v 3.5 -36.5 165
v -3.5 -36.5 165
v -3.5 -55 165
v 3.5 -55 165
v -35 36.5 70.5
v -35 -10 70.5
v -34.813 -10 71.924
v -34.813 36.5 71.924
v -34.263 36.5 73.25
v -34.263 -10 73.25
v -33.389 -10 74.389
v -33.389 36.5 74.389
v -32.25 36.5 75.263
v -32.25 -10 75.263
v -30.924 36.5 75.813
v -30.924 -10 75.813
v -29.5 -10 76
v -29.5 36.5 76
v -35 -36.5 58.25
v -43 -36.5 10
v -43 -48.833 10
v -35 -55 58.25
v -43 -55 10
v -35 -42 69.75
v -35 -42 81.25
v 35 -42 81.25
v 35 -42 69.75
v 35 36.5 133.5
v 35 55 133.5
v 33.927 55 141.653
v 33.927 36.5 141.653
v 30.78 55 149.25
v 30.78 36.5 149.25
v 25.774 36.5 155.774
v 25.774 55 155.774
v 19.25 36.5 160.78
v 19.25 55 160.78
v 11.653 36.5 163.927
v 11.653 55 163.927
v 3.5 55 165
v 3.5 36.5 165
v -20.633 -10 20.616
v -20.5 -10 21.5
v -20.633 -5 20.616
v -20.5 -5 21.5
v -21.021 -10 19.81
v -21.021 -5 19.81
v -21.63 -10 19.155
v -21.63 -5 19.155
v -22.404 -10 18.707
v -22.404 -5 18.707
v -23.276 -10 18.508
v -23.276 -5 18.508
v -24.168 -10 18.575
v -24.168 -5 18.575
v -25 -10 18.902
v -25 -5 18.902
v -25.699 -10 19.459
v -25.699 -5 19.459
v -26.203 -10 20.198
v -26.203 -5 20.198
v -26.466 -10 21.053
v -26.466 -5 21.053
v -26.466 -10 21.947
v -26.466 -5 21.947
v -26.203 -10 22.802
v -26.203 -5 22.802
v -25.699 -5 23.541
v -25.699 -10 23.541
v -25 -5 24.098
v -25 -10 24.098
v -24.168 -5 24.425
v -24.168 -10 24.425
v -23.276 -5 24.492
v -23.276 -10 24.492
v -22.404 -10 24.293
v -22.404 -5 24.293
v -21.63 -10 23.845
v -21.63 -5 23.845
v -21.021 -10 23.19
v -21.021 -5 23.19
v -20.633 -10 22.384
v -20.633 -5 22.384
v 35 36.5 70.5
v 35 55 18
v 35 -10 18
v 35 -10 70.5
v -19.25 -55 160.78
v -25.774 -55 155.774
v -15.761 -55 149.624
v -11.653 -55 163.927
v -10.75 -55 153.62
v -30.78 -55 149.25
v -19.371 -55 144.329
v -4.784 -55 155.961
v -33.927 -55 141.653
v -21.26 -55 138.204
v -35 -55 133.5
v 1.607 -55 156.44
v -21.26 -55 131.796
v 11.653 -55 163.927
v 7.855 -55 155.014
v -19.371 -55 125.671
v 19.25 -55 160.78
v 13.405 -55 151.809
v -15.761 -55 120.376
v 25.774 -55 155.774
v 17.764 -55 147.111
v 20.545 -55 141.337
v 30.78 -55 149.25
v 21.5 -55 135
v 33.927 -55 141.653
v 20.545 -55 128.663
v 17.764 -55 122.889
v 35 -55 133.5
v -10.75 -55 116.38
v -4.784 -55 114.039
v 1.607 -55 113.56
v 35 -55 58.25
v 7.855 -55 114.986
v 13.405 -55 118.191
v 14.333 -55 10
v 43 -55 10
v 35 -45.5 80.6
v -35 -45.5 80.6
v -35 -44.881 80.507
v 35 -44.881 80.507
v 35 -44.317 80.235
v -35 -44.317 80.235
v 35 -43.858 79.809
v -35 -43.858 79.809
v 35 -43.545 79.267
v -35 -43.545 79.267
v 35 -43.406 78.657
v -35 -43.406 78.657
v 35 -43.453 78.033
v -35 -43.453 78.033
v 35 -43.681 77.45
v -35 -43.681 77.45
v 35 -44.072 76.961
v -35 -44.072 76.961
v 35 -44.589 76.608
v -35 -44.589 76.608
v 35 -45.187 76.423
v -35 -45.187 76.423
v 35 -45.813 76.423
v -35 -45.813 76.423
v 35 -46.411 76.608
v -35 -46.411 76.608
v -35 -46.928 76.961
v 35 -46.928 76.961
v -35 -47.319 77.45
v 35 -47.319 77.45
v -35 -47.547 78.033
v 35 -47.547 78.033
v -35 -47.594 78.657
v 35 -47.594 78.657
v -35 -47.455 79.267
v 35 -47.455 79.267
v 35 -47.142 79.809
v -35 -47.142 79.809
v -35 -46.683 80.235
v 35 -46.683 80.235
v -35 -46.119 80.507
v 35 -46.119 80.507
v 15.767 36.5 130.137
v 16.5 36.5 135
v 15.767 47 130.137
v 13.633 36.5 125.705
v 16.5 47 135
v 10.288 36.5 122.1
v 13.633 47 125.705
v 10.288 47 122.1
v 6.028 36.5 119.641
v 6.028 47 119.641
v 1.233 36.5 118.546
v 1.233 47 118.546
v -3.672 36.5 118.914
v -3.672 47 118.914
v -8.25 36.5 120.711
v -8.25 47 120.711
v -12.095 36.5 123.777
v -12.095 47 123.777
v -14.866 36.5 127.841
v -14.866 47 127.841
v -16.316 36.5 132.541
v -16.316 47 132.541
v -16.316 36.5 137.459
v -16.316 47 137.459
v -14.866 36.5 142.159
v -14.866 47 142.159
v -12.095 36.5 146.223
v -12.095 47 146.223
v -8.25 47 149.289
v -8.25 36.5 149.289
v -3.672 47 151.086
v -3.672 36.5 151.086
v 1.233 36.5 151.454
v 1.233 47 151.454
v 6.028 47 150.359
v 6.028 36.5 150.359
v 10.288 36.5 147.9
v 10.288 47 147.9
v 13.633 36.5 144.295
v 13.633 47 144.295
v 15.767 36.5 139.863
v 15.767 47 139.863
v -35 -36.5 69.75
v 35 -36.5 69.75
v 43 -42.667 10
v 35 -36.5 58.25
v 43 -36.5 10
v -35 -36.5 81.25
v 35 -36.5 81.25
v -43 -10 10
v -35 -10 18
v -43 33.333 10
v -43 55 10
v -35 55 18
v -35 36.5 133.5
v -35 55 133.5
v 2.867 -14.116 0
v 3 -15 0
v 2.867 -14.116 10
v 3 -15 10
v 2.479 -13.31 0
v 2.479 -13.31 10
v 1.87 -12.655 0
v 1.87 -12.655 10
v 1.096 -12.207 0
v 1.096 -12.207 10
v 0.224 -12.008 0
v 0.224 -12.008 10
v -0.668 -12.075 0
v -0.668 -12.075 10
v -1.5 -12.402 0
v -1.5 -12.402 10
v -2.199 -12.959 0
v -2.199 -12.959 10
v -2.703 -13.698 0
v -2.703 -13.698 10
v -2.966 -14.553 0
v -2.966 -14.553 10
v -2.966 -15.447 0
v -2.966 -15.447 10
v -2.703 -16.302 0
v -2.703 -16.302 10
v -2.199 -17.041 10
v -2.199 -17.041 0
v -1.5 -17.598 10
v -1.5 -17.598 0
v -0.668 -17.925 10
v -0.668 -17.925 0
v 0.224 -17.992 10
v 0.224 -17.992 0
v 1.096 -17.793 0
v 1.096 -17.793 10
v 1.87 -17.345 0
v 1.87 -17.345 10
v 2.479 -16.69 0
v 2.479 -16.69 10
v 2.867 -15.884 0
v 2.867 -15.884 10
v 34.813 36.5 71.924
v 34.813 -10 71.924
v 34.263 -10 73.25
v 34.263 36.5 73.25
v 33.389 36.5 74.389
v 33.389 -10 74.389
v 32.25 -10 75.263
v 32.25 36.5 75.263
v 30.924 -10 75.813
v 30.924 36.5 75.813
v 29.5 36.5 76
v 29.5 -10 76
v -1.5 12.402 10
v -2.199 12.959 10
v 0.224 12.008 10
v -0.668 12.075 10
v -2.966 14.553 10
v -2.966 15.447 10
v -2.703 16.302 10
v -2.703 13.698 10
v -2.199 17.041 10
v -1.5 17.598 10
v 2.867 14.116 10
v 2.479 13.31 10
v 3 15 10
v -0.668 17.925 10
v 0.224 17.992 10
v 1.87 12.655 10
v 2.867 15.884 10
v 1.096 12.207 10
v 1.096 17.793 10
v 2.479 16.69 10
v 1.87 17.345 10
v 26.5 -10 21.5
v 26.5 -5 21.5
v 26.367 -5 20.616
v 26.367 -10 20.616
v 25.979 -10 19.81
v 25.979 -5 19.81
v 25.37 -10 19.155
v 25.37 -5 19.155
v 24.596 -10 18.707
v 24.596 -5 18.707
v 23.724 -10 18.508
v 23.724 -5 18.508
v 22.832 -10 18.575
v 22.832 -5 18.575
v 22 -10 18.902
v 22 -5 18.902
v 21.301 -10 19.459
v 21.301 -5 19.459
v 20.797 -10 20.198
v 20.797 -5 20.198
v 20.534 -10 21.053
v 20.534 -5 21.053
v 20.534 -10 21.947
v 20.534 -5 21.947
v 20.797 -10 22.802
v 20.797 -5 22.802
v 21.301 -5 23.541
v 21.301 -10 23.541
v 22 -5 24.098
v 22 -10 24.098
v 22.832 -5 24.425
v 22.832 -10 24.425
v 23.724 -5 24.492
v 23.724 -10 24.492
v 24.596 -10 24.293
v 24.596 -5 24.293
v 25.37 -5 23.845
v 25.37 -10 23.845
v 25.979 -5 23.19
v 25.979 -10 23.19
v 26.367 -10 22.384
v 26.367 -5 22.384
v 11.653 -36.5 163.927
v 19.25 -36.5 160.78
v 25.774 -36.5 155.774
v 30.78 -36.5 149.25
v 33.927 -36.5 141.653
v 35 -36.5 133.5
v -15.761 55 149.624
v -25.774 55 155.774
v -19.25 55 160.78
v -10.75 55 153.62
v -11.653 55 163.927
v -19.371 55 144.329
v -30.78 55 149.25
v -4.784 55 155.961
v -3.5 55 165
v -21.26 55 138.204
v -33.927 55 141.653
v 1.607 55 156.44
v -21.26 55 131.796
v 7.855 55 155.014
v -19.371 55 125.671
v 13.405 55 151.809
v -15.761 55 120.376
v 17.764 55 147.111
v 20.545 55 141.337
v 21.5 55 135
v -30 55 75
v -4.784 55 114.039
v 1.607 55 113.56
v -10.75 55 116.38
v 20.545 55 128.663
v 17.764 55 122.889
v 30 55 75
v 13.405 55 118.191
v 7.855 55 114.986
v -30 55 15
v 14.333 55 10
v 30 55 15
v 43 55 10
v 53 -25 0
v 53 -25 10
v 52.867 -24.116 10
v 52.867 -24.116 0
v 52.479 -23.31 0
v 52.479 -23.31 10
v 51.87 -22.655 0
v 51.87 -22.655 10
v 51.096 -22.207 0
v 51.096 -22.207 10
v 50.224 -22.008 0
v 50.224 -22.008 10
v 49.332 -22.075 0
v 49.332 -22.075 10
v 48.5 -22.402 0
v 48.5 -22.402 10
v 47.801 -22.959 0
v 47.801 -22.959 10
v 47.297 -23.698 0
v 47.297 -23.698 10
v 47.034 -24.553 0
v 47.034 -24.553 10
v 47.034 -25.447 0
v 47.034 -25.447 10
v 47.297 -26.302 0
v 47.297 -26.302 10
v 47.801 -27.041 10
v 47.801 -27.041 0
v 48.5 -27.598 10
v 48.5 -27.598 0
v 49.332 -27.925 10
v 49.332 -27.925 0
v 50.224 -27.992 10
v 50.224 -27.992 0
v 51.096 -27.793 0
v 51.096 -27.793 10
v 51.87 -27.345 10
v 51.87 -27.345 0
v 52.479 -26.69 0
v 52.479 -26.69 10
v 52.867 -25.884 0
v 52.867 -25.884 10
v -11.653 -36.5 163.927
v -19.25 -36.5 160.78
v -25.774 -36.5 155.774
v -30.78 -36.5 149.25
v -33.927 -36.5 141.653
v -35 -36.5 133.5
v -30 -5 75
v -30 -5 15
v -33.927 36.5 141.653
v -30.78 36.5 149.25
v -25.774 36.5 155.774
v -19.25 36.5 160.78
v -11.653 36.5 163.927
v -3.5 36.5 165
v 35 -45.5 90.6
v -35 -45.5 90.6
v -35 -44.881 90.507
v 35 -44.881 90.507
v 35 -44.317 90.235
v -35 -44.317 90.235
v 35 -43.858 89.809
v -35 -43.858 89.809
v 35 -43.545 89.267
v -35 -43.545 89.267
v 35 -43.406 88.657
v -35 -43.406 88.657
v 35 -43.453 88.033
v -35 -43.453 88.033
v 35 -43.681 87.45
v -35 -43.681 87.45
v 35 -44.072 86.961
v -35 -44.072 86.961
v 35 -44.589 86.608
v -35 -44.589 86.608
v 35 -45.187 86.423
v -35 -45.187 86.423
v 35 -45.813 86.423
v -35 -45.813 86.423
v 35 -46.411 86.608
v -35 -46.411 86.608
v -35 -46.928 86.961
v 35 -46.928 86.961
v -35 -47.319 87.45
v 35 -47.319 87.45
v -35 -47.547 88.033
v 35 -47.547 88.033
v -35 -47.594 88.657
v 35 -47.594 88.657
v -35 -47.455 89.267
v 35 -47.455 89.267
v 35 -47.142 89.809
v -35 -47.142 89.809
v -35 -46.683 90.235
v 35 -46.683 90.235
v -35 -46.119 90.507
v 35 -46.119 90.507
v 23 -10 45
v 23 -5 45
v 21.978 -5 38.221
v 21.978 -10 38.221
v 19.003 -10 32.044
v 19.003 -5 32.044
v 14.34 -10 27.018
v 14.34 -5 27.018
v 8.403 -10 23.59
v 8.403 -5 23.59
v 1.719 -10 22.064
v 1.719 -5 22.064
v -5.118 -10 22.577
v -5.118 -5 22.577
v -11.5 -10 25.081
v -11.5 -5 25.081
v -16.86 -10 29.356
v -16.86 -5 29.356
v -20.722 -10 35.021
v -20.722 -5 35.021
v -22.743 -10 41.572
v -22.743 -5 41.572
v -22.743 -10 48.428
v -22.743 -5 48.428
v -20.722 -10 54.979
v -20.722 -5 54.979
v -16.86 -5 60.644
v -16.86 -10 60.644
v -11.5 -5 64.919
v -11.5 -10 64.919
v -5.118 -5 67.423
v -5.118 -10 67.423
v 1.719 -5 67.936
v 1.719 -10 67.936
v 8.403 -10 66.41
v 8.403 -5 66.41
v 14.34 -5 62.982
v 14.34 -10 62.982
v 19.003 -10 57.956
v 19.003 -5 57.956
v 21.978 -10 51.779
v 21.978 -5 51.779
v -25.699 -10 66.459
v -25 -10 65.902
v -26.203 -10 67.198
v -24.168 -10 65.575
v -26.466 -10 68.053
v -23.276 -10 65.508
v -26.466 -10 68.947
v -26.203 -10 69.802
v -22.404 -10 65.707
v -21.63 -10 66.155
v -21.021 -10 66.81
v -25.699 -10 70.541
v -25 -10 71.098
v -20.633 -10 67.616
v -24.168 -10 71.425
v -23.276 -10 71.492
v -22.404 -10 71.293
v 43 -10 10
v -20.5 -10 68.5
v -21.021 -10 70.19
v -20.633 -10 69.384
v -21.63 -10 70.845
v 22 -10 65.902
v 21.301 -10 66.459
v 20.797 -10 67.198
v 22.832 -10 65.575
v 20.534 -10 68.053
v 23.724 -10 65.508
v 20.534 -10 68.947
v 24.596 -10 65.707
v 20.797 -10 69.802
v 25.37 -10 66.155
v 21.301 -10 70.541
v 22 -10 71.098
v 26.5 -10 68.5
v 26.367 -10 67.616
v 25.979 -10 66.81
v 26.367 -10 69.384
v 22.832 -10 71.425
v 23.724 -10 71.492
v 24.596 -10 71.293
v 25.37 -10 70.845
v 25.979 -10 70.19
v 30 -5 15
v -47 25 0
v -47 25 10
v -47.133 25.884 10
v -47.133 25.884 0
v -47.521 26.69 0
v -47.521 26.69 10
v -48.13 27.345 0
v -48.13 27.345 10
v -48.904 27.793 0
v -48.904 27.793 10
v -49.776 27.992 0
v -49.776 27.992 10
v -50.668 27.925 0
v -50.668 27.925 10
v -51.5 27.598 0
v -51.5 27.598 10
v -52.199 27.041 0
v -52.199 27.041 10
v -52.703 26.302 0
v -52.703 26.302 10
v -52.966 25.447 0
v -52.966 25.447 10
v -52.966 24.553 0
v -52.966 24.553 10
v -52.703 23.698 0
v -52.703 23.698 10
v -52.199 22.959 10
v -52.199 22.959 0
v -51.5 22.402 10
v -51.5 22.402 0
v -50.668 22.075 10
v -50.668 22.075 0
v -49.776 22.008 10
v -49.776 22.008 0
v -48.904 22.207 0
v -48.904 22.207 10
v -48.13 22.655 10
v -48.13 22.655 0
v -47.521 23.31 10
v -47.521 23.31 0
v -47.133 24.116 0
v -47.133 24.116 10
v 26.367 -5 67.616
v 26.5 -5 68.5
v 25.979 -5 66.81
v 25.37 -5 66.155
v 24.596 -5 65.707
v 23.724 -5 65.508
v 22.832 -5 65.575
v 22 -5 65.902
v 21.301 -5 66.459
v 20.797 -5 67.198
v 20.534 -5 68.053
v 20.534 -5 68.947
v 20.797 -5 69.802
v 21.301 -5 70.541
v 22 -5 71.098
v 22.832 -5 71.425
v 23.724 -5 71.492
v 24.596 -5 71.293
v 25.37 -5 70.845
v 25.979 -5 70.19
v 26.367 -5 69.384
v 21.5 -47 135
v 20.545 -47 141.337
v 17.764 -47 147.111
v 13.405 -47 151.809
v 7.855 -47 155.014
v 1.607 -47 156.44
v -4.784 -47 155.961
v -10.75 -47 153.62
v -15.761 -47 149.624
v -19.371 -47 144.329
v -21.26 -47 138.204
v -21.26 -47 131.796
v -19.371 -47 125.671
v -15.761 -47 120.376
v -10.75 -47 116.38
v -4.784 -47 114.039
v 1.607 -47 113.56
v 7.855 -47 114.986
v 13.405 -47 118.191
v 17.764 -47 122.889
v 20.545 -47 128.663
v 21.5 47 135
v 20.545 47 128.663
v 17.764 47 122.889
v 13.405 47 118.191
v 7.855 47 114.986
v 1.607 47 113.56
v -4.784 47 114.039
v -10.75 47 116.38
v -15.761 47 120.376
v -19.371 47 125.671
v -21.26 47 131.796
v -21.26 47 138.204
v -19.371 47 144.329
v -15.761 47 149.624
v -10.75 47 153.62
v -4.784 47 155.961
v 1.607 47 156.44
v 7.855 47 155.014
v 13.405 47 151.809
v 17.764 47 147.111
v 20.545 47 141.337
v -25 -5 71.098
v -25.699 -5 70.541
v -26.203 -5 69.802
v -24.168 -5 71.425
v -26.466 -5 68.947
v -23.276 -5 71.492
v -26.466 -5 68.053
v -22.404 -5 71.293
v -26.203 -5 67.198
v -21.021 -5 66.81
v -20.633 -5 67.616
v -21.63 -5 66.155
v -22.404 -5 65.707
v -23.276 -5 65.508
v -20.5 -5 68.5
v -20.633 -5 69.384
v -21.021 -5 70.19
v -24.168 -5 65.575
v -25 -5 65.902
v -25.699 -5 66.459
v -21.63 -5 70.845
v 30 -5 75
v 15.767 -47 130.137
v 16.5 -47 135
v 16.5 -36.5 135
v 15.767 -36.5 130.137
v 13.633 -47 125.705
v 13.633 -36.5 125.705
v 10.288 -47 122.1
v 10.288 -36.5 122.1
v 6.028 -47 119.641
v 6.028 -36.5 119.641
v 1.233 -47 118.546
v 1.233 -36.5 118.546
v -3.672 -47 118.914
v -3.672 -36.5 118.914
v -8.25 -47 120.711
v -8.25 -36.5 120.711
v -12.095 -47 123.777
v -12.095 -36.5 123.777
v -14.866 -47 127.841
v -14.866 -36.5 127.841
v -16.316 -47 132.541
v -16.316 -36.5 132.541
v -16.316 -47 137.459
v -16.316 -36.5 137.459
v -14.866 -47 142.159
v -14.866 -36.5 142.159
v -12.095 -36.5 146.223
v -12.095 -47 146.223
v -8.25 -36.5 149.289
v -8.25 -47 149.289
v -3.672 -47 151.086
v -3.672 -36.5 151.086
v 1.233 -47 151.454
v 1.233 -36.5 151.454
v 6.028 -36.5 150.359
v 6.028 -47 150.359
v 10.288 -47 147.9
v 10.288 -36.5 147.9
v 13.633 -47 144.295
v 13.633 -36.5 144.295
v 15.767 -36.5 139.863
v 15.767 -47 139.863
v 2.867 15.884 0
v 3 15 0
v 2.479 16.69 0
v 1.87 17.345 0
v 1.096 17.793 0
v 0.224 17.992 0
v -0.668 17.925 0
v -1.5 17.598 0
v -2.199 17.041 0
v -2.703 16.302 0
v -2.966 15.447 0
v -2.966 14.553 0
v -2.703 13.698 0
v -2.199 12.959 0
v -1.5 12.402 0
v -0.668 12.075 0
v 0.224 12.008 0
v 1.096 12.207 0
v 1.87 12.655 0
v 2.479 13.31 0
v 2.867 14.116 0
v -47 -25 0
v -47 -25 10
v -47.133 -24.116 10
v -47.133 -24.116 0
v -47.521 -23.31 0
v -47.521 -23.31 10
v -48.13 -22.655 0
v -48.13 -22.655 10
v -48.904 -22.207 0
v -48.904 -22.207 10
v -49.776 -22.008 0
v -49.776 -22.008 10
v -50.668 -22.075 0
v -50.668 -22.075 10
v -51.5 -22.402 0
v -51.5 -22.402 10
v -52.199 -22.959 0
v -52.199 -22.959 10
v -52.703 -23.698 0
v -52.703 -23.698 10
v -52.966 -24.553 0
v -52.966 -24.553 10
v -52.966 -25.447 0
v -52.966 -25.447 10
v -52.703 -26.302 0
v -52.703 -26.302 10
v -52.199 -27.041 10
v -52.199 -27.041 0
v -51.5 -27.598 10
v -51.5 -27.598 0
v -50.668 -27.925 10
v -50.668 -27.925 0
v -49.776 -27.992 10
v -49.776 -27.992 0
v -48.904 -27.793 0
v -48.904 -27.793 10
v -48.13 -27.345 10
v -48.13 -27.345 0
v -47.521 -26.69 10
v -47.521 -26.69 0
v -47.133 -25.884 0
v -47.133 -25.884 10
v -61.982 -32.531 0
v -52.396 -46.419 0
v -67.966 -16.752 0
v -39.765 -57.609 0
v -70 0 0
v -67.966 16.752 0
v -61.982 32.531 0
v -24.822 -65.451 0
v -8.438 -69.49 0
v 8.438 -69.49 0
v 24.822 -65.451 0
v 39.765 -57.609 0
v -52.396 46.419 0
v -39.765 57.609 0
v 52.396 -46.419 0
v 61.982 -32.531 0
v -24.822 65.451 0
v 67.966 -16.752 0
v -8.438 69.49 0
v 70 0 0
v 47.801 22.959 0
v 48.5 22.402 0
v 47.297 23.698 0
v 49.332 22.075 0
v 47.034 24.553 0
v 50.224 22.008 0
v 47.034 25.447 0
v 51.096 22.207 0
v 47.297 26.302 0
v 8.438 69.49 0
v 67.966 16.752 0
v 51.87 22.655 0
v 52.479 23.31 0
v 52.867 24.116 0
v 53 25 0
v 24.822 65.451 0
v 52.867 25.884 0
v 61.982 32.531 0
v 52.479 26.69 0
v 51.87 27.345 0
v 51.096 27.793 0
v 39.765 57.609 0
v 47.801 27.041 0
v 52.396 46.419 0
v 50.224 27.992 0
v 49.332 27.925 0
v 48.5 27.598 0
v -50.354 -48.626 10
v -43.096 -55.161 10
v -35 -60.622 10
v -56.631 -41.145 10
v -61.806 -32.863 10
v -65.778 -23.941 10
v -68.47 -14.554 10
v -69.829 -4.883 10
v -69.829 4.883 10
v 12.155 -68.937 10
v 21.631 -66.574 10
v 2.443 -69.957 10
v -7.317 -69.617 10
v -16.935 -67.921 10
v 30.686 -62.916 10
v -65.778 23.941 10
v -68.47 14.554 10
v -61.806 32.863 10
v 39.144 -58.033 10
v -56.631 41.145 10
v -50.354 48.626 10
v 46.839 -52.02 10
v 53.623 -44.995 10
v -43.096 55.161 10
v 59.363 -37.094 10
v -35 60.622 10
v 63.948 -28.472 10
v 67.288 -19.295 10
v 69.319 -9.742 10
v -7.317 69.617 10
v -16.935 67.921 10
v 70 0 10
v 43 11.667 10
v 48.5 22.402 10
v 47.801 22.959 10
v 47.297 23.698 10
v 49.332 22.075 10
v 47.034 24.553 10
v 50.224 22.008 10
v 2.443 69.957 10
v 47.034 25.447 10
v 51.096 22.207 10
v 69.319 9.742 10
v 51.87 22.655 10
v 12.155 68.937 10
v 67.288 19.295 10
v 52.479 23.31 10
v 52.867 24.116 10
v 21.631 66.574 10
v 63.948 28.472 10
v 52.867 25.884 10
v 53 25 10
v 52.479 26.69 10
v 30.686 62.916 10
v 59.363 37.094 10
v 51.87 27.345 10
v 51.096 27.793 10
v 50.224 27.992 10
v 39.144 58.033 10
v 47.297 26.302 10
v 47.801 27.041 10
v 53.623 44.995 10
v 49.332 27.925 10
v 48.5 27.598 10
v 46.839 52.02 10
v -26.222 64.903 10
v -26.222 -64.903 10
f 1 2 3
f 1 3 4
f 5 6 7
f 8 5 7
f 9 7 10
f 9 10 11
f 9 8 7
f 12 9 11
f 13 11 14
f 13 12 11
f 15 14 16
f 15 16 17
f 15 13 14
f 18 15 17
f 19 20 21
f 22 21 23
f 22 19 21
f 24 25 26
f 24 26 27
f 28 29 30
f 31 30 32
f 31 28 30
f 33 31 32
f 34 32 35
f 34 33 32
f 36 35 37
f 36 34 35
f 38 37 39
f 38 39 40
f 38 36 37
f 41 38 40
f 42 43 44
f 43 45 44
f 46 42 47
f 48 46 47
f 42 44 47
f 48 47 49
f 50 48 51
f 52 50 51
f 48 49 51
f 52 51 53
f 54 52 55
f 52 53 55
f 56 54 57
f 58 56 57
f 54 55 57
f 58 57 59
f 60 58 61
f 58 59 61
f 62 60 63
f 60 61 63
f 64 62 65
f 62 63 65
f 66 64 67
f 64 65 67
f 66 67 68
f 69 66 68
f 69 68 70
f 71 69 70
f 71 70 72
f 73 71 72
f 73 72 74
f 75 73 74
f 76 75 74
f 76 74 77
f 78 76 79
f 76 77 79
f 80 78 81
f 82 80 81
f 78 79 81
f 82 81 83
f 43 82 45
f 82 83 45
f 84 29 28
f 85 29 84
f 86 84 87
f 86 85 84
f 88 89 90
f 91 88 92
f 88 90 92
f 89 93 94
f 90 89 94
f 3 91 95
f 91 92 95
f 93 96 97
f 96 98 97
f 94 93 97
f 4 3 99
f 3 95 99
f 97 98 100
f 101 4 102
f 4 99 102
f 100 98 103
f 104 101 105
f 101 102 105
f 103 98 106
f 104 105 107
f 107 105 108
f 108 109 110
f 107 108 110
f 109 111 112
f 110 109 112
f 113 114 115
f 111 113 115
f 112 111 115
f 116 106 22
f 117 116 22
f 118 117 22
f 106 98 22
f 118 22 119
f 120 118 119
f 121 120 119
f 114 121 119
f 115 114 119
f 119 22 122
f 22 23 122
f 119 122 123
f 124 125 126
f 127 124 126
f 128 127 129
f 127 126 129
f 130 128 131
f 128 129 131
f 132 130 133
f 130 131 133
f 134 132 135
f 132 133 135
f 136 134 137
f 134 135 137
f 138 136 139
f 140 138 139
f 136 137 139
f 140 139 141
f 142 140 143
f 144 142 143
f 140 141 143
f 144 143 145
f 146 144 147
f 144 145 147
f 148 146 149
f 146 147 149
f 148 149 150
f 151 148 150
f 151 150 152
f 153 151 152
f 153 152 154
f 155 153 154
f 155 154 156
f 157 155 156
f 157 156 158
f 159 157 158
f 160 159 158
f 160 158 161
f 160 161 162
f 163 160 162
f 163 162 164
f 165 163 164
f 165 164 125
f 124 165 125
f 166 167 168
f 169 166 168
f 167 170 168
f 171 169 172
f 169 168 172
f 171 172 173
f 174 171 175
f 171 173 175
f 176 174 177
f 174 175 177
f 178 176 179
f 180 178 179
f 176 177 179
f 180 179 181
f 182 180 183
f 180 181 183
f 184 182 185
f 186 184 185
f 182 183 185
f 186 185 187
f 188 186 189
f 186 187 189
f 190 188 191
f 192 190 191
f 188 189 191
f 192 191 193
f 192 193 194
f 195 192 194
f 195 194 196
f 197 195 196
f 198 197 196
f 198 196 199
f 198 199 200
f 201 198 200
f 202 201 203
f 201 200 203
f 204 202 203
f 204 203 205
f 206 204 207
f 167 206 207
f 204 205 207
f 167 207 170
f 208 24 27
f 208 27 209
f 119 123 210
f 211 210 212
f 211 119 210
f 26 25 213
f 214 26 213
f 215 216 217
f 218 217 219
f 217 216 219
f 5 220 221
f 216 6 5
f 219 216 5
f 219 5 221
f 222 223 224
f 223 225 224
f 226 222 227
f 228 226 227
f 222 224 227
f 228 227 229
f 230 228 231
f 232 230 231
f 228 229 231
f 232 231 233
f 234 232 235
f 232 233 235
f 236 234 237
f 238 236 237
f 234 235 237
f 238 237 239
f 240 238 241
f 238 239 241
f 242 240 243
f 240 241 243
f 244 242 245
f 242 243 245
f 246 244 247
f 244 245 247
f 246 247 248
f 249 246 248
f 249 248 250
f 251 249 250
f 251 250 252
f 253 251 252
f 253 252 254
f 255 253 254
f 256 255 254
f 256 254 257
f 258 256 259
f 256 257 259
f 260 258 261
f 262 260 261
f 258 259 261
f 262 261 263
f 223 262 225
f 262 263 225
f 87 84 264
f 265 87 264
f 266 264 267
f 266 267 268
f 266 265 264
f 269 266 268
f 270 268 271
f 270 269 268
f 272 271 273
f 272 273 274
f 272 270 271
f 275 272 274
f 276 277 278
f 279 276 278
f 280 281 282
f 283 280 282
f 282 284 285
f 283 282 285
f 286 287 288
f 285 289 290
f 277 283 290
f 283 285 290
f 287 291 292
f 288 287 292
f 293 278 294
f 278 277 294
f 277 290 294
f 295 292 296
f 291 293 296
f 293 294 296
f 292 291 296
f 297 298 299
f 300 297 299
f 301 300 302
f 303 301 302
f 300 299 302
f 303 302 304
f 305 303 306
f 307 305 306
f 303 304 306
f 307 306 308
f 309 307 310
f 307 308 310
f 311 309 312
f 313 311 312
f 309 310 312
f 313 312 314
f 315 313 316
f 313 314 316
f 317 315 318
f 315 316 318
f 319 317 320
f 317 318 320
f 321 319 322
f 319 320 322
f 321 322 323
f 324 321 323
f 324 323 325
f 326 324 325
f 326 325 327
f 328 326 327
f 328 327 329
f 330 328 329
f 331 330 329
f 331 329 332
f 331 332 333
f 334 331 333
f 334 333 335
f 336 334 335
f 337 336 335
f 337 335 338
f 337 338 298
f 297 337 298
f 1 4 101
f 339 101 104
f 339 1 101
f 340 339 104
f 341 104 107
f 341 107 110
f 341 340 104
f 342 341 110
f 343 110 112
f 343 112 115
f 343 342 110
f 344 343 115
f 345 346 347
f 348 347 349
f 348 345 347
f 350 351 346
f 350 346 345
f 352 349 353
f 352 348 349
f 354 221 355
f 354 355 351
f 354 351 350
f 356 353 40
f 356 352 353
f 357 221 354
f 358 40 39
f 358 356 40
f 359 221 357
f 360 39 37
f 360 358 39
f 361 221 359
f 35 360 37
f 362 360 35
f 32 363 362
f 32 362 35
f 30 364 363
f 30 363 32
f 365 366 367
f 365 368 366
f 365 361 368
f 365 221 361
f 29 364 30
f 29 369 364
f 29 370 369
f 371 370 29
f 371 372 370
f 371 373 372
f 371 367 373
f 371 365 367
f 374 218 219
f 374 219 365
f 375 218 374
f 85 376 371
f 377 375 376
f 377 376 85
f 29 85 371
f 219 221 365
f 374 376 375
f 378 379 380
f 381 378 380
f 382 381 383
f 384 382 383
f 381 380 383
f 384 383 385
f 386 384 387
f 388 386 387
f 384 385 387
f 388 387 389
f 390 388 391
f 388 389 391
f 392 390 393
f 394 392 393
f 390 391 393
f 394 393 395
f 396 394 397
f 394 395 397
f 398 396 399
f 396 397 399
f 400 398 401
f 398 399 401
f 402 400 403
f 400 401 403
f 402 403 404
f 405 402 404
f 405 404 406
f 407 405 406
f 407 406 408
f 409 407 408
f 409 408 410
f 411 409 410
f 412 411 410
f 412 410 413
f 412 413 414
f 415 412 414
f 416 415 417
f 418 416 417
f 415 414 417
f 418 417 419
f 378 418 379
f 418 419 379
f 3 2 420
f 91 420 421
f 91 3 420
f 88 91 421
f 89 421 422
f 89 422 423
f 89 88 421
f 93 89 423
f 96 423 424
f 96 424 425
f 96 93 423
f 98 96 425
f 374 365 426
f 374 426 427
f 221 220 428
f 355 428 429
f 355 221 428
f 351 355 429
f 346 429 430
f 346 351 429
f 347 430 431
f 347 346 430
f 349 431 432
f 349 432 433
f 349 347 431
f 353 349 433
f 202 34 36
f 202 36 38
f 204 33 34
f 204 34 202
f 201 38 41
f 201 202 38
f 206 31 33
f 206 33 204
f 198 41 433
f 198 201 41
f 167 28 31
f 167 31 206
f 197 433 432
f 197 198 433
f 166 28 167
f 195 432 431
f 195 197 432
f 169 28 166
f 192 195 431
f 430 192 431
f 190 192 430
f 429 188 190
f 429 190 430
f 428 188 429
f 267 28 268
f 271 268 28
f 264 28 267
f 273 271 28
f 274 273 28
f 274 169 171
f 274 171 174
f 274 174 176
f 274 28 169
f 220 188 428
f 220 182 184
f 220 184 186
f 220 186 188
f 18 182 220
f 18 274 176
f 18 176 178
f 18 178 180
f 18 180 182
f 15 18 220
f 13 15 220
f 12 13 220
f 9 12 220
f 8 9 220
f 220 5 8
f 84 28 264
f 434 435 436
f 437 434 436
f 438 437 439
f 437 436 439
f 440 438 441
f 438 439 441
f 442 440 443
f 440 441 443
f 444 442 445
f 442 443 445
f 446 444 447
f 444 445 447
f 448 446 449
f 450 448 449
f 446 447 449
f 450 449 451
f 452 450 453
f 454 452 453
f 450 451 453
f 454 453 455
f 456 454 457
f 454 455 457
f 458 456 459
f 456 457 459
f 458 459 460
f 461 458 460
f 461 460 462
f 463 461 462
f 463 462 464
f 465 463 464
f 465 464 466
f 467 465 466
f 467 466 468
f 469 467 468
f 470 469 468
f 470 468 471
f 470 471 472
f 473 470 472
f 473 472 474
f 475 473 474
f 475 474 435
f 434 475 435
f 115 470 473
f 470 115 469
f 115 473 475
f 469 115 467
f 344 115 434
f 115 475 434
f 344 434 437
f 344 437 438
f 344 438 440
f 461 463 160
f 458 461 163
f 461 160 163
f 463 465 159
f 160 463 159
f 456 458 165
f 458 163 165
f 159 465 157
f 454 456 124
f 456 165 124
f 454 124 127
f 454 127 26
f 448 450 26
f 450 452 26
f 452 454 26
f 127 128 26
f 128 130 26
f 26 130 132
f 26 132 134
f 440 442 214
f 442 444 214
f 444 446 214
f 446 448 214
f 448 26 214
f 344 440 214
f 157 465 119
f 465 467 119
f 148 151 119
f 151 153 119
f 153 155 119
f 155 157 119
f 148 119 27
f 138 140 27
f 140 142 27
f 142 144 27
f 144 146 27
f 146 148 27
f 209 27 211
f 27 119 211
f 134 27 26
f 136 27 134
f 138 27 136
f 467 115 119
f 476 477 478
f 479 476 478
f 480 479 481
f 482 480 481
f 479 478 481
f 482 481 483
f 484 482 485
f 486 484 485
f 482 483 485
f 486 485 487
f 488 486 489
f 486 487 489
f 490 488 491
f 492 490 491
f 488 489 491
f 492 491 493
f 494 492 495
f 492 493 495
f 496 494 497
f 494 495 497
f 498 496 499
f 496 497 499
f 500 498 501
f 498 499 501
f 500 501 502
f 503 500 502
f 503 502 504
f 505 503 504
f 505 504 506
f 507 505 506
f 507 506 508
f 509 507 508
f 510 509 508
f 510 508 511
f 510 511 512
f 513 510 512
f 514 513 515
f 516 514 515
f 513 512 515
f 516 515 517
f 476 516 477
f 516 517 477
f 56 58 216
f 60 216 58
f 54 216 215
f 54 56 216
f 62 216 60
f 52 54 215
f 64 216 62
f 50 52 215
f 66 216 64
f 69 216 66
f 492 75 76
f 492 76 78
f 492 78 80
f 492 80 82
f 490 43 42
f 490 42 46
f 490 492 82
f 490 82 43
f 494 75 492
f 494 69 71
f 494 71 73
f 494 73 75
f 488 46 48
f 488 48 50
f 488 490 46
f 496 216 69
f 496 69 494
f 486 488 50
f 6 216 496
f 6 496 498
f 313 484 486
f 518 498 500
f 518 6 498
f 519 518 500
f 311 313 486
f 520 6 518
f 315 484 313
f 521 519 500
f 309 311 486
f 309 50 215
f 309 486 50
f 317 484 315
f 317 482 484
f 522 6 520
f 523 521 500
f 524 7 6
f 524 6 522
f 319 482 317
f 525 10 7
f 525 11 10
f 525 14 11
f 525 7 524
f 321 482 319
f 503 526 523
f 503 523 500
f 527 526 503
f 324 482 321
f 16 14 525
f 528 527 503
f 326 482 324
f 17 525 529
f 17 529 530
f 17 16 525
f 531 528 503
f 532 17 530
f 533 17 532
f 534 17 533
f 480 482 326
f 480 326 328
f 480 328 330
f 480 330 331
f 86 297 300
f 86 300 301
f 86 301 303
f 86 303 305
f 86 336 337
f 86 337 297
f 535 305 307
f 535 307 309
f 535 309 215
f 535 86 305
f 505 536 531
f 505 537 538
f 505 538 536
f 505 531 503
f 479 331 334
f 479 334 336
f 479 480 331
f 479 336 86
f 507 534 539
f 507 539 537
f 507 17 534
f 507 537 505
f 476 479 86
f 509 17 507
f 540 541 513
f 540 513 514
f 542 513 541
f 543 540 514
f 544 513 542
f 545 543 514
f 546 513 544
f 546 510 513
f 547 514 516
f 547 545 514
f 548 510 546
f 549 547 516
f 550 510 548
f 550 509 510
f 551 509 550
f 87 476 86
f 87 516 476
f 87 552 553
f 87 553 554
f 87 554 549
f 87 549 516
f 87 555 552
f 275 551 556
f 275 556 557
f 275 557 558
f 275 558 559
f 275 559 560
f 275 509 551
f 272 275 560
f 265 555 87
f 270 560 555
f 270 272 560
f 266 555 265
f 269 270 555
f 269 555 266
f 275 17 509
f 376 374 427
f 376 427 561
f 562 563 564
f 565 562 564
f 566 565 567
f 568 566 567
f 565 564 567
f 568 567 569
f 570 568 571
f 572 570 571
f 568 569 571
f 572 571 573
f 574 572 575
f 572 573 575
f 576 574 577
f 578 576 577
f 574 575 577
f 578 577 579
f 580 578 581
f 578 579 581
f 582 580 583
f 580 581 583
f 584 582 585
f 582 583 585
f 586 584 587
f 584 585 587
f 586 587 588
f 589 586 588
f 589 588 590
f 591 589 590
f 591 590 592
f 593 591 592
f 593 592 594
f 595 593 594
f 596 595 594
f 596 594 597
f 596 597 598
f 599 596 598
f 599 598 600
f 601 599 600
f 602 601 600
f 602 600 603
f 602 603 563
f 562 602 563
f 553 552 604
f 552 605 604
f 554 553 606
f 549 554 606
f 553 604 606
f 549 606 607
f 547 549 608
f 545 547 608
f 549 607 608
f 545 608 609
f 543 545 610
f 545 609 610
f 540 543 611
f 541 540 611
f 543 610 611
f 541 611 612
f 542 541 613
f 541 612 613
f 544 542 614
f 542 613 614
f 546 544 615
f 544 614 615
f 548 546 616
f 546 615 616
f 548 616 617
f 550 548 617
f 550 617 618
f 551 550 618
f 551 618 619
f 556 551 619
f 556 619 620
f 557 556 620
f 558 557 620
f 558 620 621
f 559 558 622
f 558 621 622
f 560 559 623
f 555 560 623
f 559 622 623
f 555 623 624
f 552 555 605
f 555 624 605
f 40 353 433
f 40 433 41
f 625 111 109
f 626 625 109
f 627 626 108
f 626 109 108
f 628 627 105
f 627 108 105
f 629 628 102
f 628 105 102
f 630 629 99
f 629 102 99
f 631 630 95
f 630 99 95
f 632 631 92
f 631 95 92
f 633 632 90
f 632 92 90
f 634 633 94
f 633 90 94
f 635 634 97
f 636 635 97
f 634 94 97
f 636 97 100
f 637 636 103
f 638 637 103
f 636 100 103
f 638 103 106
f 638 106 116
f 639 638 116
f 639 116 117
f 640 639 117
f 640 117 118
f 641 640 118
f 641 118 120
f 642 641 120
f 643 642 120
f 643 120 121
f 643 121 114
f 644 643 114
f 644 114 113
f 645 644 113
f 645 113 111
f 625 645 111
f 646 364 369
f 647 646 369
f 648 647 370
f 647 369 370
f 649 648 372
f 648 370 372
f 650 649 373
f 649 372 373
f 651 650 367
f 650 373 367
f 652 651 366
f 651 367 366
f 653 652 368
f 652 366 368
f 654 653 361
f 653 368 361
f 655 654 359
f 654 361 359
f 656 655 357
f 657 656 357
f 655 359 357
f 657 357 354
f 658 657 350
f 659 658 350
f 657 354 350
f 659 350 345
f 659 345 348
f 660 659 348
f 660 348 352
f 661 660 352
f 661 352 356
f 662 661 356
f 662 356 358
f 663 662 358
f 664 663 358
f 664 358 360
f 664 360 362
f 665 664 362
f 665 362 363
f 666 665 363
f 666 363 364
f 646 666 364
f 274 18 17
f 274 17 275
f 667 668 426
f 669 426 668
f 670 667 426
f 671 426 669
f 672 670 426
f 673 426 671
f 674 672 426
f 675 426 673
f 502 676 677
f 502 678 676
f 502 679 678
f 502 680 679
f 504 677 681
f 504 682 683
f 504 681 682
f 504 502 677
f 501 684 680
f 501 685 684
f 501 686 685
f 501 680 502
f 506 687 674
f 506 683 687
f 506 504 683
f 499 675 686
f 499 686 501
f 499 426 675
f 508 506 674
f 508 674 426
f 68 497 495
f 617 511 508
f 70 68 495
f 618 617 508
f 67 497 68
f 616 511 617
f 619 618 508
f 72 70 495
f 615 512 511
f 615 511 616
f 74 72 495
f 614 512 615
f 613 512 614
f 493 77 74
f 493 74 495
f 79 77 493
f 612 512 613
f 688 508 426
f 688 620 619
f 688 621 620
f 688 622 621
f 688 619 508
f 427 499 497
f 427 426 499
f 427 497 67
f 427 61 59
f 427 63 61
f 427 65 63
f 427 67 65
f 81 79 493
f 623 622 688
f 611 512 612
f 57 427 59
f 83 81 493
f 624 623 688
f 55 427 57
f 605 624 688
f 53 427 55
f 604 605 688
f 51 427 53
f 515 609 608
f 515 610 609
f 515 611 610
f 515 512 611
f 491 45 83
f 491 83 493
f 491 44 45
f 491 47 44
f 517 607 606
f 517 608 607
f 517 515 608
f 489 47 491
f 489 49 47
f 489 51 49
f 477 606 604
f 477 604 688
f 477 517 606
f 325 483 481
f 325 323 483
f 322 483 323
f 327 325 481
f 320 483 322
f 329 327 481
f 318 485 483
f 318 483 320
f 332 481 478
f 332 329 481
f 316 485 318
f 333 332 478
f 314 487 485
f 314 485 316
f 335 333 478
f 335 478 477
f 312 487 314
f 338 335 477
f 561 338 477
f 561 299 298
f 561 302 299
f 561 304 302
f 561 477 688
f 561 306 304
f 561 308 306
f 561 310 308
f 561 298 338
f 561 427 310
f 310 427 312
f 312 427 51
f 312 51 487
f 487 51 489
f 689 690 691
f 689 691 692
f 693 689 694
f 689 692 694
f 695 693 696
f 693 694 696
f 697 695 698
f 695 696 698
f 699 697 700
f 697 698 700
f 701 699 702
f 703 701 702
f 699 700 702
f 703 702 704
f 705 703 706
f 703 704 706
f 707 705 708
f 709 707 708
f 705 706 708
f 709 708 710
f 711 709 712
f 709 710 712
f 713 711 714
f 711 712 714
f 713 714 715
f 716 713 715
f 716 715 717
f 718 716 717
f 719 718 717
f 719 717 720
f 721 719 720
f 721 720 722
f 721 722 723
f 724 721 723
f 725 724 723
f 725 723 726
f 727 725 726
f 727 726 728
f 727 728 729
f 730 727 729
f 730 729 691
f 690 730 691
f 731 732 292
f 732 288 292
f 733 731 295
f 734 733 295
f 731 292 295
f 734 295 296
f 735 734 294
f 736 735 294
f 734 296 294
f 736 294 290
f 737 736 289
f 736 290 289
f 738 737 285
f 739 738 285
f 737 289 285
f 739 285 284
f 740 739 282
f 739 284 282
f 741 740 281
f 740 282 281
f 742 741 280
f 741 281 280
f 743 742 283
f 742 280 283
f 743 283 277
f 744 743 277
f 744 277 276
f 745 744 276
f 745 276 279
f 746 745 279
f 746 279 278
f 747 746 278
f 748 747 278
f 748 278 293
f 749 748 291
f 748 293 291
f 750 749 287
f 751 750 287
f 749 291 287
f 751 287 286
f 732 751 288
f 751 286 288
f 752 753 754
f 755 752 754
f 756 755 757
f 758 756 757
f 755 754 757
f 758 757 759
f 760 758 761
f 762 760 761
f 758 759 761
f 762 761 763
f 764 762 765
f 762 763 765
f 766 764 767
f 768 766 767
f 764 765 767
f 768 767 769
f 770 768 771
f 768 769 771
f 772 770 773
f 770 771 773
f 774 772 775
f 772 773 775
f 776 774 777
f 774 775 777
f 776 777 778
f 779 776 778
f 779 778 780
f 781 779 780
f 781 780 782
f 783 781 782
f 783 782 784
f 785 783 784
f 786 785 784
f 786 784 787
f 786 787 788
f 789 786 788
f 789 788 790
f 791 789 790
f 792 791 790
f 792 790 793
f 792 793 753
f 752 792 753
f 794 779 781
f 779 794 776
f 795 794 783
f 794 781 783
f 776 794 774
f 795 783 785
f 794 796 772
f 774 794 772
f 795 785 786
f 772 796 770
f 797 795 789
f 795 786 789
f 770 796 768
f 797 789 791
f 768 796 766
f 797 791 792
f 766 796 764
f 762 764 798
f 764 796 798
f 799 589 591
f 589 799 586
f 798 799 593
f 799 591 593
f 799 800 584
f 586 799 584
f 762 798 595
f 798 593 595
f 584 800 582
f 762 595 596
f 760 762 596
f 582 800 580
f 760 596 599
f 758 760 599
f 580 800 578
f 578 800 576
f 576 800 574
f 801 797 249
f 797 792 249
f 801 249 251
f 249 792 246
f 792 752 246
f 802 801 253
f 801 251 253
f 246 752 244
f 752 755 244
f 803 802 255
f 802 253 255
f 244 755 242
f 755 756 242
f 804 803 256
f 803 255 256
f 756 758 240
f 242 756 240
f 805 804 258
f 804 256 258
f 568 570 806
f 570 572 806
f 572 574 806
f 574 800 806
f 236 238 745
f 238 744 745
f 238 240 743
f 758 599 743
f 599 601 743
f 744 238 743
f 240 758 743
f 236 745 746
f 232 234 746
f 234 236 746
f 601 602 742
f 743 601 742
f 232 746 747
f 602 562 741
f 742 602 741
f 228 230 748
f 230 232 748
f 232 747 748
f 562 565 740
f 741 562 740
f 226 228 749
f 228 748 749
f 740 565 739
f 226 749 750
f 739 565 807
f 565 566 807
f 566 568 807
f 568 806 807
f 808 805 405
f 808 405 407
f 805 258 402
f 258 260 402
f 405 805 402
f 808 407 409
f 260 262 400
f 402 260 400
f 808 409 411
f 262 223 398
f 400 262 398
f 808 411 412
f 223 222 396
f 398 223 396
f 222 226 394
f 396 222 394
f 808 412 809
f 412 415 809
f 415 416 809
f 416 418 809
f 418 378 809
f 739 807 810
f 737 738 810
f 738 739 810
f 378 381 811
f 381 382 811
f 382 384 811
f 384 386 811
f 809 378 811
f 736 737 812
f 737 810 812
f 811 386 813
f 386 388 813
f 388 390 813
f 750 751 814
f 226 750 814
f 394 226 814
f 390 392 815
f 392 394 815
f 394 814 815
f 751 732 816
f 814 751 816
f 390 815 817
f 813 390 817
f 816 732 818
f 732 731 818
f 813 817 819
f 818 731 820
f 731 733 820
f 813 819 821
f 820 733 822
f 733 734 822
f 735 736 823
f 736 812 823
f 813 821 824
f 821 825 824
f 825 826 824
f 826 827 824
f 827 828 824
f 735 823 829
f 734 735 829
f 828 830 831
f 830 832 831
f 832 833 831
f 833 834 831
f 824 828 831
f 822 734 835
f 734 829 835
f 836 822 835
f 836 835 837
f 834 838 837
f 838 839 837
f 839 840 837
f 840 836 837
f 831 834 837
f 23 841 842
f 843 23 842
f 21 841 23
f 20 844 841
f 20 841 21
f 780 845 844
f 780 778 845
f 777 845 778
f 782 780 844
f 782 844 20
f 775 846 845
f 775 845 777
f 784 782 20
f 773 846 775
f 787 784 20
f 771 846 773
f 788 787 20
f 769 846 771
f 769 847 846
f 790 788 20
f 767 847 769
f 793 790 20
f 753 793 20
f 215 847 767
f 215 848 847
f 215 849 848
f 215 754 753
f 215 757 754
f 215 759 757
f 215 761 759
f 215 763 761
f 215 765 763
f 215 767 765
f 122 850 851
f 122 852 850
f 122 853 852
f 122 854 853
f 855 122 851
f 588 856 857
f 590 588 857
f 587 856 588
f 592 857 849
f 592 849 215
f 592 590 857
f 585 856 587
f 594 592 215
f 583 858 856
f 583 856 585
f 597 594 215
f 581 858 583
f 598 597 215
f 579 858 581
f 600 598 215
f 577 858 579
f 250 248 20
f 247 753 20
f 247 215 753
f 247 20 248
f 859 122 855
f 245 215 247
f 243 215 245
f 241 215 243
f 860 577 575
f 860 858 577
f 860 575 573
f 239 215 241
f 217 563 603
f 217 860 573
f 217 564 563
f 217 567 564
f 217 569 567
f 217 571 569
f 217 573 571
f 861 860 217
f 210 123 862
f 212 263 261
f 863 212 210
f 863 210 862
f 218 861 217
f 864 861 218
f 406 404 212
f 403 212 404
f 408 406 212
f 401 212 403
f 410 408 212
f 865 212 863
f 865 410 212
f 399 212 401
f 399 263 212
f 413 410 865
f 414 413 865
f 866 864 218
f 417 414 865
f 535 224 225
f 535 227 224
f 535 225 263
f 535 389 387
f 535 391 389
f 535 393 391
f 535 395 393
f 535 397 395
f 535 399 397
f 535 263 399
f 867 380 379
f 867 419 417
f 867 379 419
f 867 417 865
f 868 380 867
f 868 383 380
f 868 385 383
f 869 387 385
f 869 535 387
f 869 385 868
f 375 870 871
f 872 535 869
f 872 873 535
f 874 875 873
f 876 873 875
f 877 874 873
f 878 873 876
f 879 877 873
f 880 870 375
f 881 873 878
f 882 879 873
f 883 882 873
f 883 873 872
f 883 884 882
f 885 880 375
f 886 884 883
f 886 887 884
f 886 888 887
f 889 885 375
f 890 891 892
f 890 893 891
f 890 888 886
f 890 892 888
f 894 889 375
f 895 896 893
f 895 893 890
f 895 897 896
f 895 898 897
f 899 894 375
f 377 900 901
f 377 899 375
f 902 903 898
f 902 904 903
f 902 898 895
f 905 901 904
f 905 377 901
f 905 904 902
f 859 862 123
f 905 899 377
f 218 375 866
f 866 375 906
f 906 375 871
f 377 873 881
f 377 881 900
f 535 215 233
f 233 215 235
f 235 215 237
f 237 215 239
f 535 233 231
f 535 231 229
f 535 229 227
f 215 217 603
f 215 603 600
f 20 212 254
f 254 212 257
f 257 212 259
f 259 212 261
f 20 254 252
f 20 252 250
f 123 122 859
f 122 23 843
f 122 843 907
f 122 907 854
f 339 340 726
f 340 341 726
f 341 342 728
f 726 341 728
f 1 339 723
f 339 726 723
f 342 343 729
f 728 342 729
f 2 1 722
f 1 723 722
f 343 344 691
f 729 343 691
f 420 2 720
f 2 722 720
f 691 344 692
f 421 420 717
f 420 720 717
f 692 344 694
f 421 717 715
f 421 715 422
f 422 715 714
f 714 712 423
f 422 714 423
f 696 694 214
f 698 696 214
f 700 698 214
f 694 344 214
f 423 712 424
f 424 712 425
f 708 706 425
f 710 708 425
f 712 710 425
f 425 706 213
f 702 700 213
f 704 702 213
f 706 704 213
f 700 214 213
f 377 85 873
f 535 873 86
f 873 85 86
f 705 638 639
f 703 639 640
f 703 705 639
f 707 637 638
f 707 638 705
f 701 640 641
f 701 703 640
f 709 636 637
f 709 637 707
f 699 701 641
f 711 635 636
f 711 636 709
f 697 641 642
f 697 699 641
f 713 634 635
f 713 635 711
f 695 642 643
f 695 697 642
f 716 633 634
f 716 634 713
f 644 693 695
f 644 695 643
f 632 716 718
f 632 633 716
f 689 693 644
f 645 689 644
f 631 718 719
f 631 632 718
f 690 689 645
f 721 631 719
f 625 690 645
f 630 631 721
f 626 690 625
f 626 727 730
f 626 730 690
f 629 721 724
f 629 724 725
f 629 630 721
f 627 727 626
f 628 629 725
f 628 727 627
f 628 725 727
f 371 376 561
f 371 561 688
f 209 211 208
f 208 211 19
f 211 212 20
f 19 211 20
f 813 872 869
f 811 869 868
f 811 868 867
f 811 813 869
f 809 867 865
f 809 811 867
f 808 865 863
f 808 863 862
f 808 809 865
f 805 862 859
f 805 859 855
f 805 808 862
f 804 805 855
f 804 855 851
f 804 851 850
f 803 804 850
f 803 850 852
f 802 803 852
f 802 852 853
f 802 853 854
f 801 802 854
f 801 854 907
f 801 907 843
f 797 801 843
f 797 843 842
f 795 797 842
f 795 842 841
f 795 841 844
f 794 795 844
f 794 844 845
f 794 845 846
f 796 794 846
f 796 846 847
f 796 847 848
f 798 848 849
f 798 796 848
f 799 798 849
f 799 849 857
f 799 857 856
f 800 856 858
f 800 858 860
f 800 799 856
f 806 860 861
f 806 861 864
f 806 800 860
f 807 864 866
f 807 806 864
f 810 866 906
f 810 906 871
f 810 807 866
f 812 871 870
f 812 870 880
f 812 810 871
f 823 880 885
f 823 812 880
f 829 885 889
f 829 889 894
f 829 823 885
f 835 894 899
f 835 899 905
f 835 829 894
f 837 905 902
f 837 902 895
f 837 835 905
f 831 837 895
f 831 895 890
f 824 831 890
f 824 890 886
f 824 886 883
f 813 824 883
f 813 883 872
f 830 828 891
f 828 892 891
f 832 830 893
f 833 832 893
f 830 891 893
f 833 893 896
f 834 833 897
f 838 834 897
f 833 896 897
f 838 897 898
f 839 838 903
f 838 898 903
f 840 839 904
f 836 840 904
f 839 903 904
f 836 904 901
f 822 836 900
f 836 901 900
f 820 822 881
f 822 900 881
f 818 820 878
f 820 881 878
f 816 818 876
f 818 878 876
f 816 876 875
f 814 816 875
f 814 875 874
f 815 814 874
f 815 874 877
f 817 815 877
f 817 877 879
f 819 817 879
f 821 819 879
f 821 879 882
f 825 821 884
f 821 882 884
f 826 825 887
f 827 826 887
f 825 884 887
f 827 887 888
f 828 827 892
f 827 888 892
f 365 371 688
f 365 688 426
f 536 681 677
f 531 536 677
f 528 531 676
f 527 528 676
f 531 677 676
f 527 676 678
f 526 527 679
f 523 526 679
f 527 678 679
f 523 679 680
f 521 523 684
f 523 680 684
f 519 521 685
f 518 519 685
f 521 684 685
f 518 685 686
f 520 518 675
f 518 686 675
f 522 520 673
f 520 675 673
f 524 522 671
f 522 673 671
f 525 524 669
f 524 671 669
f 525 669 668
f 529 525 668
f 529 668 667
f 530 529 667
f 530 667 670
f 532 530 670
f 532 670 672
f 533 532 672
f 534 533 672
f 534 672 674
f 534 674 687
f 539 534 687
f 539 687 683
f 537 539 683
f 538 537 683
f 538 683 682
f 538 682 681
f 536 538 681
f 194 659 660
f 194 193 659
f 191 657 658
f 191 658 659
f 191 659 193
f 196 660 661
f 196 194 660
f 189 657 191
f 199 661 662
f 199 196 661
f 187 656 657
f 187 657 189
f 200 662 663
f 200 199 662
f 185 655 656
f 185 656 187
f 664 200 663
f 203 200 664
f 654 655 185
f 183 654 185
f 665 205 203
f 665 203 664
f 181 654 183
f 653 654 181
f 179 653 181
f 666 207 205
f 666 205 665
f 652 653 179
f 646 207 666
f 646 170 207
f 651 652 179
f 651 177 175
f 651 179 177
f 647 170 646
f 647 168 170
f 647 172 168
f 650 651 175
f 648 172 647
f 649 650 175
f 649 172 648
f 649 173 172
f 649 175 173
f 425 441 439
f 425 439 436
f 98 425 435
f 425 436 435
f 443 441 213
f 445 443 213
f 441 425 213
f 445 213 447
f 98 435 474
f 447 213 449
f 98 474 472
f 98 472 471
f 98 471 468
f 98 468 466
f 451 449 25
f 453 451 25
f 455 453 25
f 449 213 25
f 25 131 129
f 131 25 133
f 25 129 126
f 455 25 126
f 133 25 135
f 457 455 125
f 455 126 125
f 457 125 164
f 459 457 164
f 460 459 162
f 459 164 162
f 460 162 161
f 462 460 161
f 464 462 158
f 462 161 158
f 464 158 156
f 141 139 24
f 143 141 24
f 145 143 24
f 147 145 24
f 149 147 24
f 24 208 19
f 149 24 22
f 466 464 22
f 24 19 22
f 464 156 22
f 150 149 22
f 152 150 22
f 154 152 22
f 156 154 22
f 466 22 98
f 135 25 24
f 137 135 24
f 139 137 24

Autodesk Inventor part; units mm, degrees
ref_plane "YZ Plane" through (0, 0, 0) normal (1, 0, 0) x (0, 1, 0)
ref_plane "XZ Plane" through (0, 0, 0) normal (0, 1, 0) x (-1, 0, 0)
sketch "Sketch1" plane through (0, 0, 0) normal (0, 0, 1) x (1, 0, 0)
  circle A0 centre (0, 0) radius 70
  dimension "d0" = 140
extrude "Extrusion1" add sketch "Sketch1" along normal blind 10
sketch "Sketch2" plane through (0, 0, 10) normal (0, 0, 1) x (1, 0, 0)
  line L0 (-35, -55) -> (35, -55)
  line L1 (35, -55) -> (35, -35)
  line L2 (35, -35) -> (-35, -35)
  line L3 (-35, -35) -> (-35, -55)
  line L4 (35, 35) -> (-35, 35)
  line L5 (-35, 35) -> (-35, 55)
  line L6 (-35, 55) -> (35, 55)
  line L7 (35, 55) -> (35, 35)
  circle A0 centre (0, 0) radius 70 projected
  line L8 (-35, -35) -> (-60.6218, -35)
  line L9 (35, 35) -> (60.6218, 35)
  line L10 (-35, 35) -> (-60.6218, 35)
  line L11 (35, -35) -> (60.6218, -35)
  dimension "d3" = 35
  dimension "d4" = 35
  dimension "d5" = 20
  dimension "d6" = 70
  dimension "d7" = 35
extrude "Extrusion2" add sketch "Sketch2" along normal blind 155 contours L3 L2 L1 L0 | L5 L6 L7 L4
sketch "Sketch4" plane through (-35, 35, 10) normal (0, -1, 0) x (1, 0, 0)
  line L0 (70, 0) -> (70, 155) projected
  line L1 (0, 66) -> (70, 66)
  line L2 (70, 66) -> (70, 0)
  line L3 (70, 0) -> (0, 0)
  line L4 (0, 0) -> (0, 66)
  line L5 (0, 66) -> (70, 0) construction
  line L6 (70, 66) -> (0, 0) construction
  circle A0 centre (58.5, 11.5) radius 3 projected
  circle A1 centre (58.5, 58.5) radius 3 projected
  circle A2 centre (11.5, 11.5) radius 3 projected
  circle A3 centre (11.5, 58.5) radius 3 projected
  line L7 (62.5, 62.5) -> (7.5, 62.5) projected
  line L8 (7.5, 62.5) -> (7.5, 7.5) projected
  line L9 (7.5, 7.5) -> (62.5, 7.5) projected
  line L10 (62.5, 7.5) -> (62.5, 62.5) projected
  circle A4 centre (35, 35) radius 20 projected
  circle A5 centre (35, 35) radius 23
  point P0 (35, -10)
  dimension "d77" = 3
extrude "Extrusion4" add sketch "Sketch4" along normal blind 45 contours L3 L4 L1 L0 | L10 L9 L8 L7
sketch "Sketch3" plane through (-35, 55, 10) normal (0, 1, 0) x (1, 0, 0)
  line L0 (65, -65) -> (5, -65)
  line L1 (5, -65) -> (5, -5)
  line L2 (5, -5) -> (65, -5)
  line L3 (65, -5) -> (65, -65)
  line L4 (-35, 0) -> (105, 0) projected
  line L5 (70, 0) -> (70, -155) projected
  line L6 (35, 0) -> (35, -1.4267)
  point P0 (35, 10)
  dimension "d10" = 60
  dimension "d11" = 60
  dimension "d12" = 5
extrude "Extrusion3" cut sketch "Sketch3" against normal blind 60
sketch "Sketch5" plane through (-35, 55, 165) normal (0, 1, 0) x (1, 0, 0)
  circle A0 centre (35, 30) radius 13.5
  line L0 (70, 155) -> (70, 0) projected
  line L1 (70, 0) -> (0, 0) projected
  circle A1 centre (35, 30) radius 16.5
  point P0 (35, 165)
  point P1 (70, 125)
  point P2 (70, 69)
  dimension "d28" = 35
  dimension "d29" = 30
  dimension "d40" = 27
  dimension "d84" = 3
extrude "Extrusion5" cut sketch "Sketch5" against normal through all contours A0 | A1
ref_plane "Work Plane2" through (-35, -55, 15) normal (0, -1, 0) x (1, 0, 0)
sketch "Sketch6" plane through (-35, -55, 15) normal (0, -1, 0) x (1, 0, 0)
  circle A0 centre (35, 120) radius 13.5
  circle A1 centre (35, 120) radius 21.5
  circle A2 centre (35, 120) radius 13.5 projected
  point P0 (35, -15)
  dimension "d35" = 8
extrude "Extrusion6" cut sketch "Sketch6" against normal blind 8
ref_plane "Work Plane1" through (-40, 0, 10) normal (0, 1, 0) x (1, 0, 0)
offset faces "Size1" outward -1 faces at (0.663, -35, 46.2068) (-0.663, 35, 90.2068)
fillet "Fillet1" radius 31.5 4 edges at (-35, -45.5, 165) (35, -45.5, 165) (-35, 45.5, 165) (35, 45.5, 165)
sketch "Sketch7" plane through (0, 0, 10) normal (0, 0, 1) x (1, 0, 0)
  circle A0 centre (-50, 25) radius 3
  circle A1 centre (-50, -25) radius 3
  circle A2 centre (50, -25) radius 3
  circle A3 centre (50, 25) radius 3
  circle A4 centre (0, 15) radius 3
  circle A5 centre (0, -15) radius 3
  line L0 (-98, 0) -> (98, 0) projected
  line L1 (0, 0) -> (0, 59.6277)
  dimension "d41" = 25
  dimension "d42" = 25
  dimension "d43" = 50
  dimension "d44" = 50
  dimension "d45" = 15
  dimension "d46" = 15
  dimension "d47" = 25
  dimension "d48" = 25
  dimension "d49" = 50
  dimension "d50" = 50
  dimension "d51" = 6
extrude "Extrusion7" cut sketch "Sketch7" against normal through all
fillet "Fillet2" radius 5.5 2 edges at (35, 13, 76) (-35, 13, 76)
ref_plane "Work Plane4" through (-35, -55, 15) normal (-1, 0, 0) x (0, 0, 1)
sketch "Sketch8" plane through (-35, -55, 15) normal (-1, 0, 0) x (0, 0, 1)
  line L0 (118.5, 19) -> (118.5, 0) projected
  line L1 (-5, 19) -> (118.5, 19) projected
  line L2 (-5, 0) -> (118.5, 0) projected
  circle A0 centre (73.5, 9.5) radius 2.1
  circle A1 centre (63.5, 9.5) radius 2.1
  line L3 (-5, 0) -> (-5, 19) projected
  point P0 (-15, 55)
  dimension "d55" = 10
  dimension "d56" = 4.2
  dimension "d57" = 9.5
  dimension "d58" = 45
extrude "Extrusion8" cut sketch "Sketch8" against normal through all contours A0 | A1
chamfer "Chamfer4" distance 8 distance2 48.25 2 edges at (35, -45.5, 10) (-35, -45.5, 10) measured on face at (0.1205, -29.9927, 10)
chamfer "Chamfer5" distance 8 angle 45 2 edges at (35, 22.5, 10) (-35, 22.5, 10)
move faces "Move1" translate (0, 0.5, 0) faces at (0.663, 36, 90.2068)
move faces "Move2" translate (0, -0.5, 0) faces at (0.663, -36, 78.3734)
sketch "Sketch10" plane through (-3.5, 55, 165) normal (0, 1, 0) x (1, 0, 0)
  circle A0 centre (3.5, 30) radius 13.5 projected
  circle A1 centre (3.5, 30) radius 19
  circle A2 centre (3.5, 30) radius 21.5
  circle A3 centre (3.5, 30) radius 15.5
  point P0 (3.5, 165)
  dimension "d73" = 38
  dimension "d74" = 43
  dimension "d83" = 2
extrude "Extrusion9" cut sketch "Sketch10" against normal blind 8 contours A0 | A1 | A2 | A3
sketch "Sketch11" plane through (-35, -55, 58.25) normal (-1, 0, 0) x (0, 0, 1)
  line L0 (0, 18.5) -> (75.25, 18.5) projected
  line L1 (12.25, 16) -> (12.25, 34.5) projected
  line L2 (22.25, 16) -> (12.25, 16) projected
  line L3 (22.25, 34.5) -> (22.25, 16) projected
  line L4 (12.25, 34.5) -> (22.25, 34.5) projected
  circle A0 centre (17.25, 25.5) radius 3.2 projected
  line L5 (22.25, 16) -> (12.25, 16)
  line L6 (12.25, 16) -> (12.25, 13)
  line L7 (12.25, 13) -> (22.25, 13)
  line L8 (22.25, 13) -> (22.25, 16)
  line L9 (22.25, 13) -> (23, 13)
  line L10 (23, 13) -> (23, 18.5)
  line L11 (23, 18.5) -> (22.25, 18.5)
  line L12 (22.25, 18.5) -> (22.25, 13)
  line L13 (12.25, 13) -> (11.5, 13)
  line L14 (11.5, 13) -> (11.5, 18.5)
  line L15 (11.5, 18.5) -> (12.25, 18.5)
  line L16 (12.25, 18.5) -> (12.25, 13)
  point P0 (-58.25, 55)
  dimension "d78" = 3
  dimension "d79" = 0.75
  dimension "d80" = 0.75
extrude "Extrusion10" cut sketch "Sketch11" against normal through all contours L0 L1 L6 L13 L14 | L0 L3 L2 L1 | L0 L10 L9 L8 L3 | L2 L8 L7 L6
equation "\"d3\" = 0.5 * base_arm_widht"
equation "\"d4\" = 0.5 * base_arm_widht"
equation "\"base_arm_widht\" = 70"
properties part number "base_3DPrint"
